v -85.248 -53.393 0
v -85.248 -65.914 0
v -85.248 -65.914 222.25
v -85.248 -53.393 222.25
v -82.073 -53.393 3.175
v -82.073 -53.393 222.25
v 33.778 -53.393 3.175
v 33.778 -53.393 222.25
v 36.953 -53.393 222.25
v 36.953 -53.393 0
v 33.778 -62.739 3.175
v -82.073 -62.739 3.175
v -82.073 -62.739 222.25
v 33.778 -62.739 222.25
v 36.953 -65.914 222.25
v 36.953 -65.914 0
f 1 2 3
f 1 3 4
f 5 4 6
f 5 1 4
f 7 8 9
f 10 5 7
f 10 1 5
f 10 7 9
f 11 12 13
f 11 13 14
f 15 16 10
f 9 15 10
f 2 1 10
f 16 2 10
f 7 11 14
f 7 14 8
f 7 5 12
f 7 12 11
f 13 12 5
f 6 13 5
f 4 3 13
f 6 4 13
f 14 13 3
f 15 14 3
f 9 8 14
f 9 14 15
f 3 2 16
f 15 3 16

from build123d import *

# Parameters (mm, degrees)
SKETCH2_W           = 122.201758268
SKETCH2_H           = 12.52058784
BOSS_EXTRUDE1_DEPTH = 222.25
SHELL1_T            = -3.175


with BuildPart() as part:
    # Sketch2 → Boss-Extrude1 (new body)
    with BuildSketch(Plane.XY):
        with Locations((-24.147384347, -59.653504879)):
            Rectangle(SKETCH2_W, SKETCH2_H)
    extrude(amount=BOSS_EXTRUDE1_DEPTH)

    # Shell1
    shell1_openings = [part.faces().sort_by_distance(p)[0] for p in [
        (-24.147384347, -59.653504879, 222.25),
        (-24.147384347, -53.393210959, 111.125),
    ]]
    offset(amount=SHELL1_T, openings=shell1_openings, kind=Kind.INTERSECTION)


solid = part.part
